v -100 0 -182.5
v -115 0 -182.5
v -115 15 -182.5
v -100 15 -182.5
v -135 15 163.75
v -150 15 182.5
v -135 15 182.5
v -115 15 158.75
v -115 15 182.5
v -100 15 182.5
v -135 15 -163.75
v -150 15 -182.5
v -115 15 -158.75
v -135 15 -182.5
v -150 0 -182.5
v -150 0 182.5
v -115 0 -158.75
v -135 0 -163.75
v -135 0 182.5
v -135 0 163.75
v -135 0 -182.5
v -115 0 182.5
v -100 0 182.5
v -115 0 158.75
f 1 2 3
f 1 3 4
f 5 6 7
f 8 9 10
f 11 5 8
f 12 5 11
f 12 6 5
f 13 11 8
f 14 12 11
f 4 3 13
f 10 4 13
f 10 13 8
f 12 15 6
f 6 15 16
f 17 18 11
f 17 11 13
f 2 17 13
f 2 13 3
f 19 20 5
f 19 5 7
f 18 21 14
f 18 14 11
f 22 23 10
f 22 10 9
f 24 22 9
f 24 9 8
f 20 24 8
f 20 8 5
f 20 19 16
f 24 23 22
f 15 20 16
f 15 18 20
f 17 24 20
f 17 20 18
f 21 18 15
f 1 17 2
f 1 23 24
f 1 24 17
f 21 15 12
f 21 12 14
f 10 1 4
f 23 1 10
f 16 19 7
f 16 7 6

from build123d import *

# Parameters (mm, degrees)
BOSS_EXTRUDE1_DEPTH             = 15
BOSS_EXTRUDE2_REACH             = 1239.023
BOSS_EXTRUDE2_DIRECTION_2_REACH = 1239.023
CUT_EXTRUDE2_DEPTH              = 1238.578280352
CUT_EXTRUDE2_DEPTH_BACK         = 1238.578280352
SKETCH5_W                       = 40
SKETCH5_H                       = 40
CUT_EXTRUDE3_DEPTH              = 1238.578280352
BOSS_EXTRUDE4_DEPTH             = 75
CUT_EXTRUDE4_DEPTH              = 1241.107934819
CUT_EXTRUDE4_DEPTH_BACK         = 1241.107934819
SKETCH8_W                       = 15
SKETCH8_H                       = 73.7
FILLET1_R                       = 5
CUT_EXTRUDE5_DEPTH              = 1241.107934819
CUT_EXTRUDE5_DEPTH_BACK         = 1241.107934819
SKETCH9_W                       = 25
SKETCH9_H                       = 15
SKETCH9_W_2                     = 15
CUT_EXTRUDE6_DEPTH              = 1241.107934819
CUT_EXTRUDE6_DEPTH_BACK         = 1241.107934819
SKETCH10_W                      = 1728.920732784
SKETCH10_H                      = 178.853868908
SKETCH10_W_2                    = 1650
SKETCH10_H_2                    = 15
SKETCH11_W                      = 1852.680615207
SKETCH11_H                      = 1075.927112831
CUT_EXTRUDE7_DEPTH              = 1238.022635201


with BuildPart() as part:
    # Sketch1 → Boss-Extrude1 (new body)
    with BuildSketch(Plane(origin=(0, 0, 0), x_dir=(1, 0, 0), z_dir=(0, 1, 0))):
        Polygon((-450, 300), (-400, 300), (-200, 250), (600, 40), (1200, 40), (1200, -40), (600, -40), (-200, -250), (-400, -300), (-450, -300), align=None)
    extrude(amount=BOSS_EXTRUDE1_DEPTH)

    # Boss-Extrude2: up to this face of the body (flat: up to its plane)
    boss_extrude2_end = Plane(part.part.faces().sort_by_distance((-425, 7.5, 300))[0])
    # Sketch2 → Boss-Extrude2 (add, up to the picked face)
    with BuildSketch(Plane.XY, mode=Mode.PRIVATE) as boss_extrude2_sk1:
        with BuildLine():
            Line((-425, 0), (-450, 0))
            Line((-450, 0), (-450, -40))
            Line((-450, -40), (-440, -40))
            Line((-440, -40), (-440, -15))
            ThreePointArc((-440, -15), (-435.606601718, -4.393398282), (-425, 0))
        make_face()
    boss_extrude2_tool1 = split(extrude(boss_extrude2_sk1.sketch, amount=BOSS_EXTRUDE2_REACH, mode=Mode.PRIVATE), bisect_by=boss_extrude2_end, keep=Keep.BOTH, mode=Mode.PRIVATE)
    # Sketch2 → Boss-Extrude2 (add, up to the picked face)
    with BuildSketch(Plane.XY, mode=Mode.PRIVATE) as boss_extrude2_sk2:
        with BuildLine():
            Line((-400, 0), (-425, 0))
            ThreePointArc((-425, 0), (-414.393398282, -4.393398282), (-410, -15))
            Line((-410, -15), (-410, -40))
            Line((-410, -40), (-400, -40))
            Line((-400, -40), (-400, 0))
        make_face()
    boss_extrude2_tool2 = split(extrude(boss_extrude2_sk2.sketch, amount=BOSS_EXTRUDE2_REACH, mode=Mode.PRIVATE), bisect_by=boss_extrude2_end, keep=Keep.BOTH, mode=Mode.PRIVATE)
    add(boss_extrude2_tool1.solids().sort_by(Axis((-444.100555, -18.206662, 0), (0, 0, 1)))[0])
    add(boss_extrude2_tool2.solids().sort_by(Axis((-405.899445, -18.206662, 0), (0, 0, 1)))[0])

    # Boss-Extrude2 direction 2: up to this face of the body (flat: up to its plane)
    boss_extrude2_direction_2_end = Plane(part.part.faces().sort_by_distance((-425, 7.5, -300))[0])
    # Sketch2 → Boss-Extrude2 direction 2 (add, up to the picked face)
    with BuildSketch(Plane.XY, mode=Mode.PRIVATE) as boss_extrude2_direction_2_sk1:
        with BuildLine():
            Line((-425, 0), (-450, 0))
            Line((-450, 0), (-450, -40))
            Line((-450, -40), (-440, -40))
            Line((-440, -40), (-440, -15))
            ThreePointArc((-440, -15), (-435.606601718, -4.393398282), (-425, 0))
        make_face()
    boss_extrude2_direction_2_tool1 = split(extrude(boss_extrude2_direction_2_sk1.sketch, amount=-BOSS_EXTRUDE2_DIRECTION_2_REACH, mode=Mode.PRIVATE), bisect_by=boss_extrude2_direction_2_end, keep=Keep.BOTH, mode=Mode.PRIVATE)
    # Sketch2 → Boss-Extrude2 direction 2 (add, up to the picked face)
    with BuildSketch(Plane.XY, mode=Mode.PRIVATE) as boss_extrude2_direction_2_sk2:
        with BuildLine():
            Line((-400, 0), (-425, 0))
            ThreePointArc((-425, 0), (-414.393398282, -4.393398282), (-410, -15))
            Line((-410, -15), (-410, -40))
            Line((-410, -40), (-400, -40))
            Line((-400, -40), (-400, 0))
        make_face()
    boss_extrude2_direction_2_tool2 = split(extrude(boss_extrude2_direction_2_sk2.sketch, amount=-BOSS_EXTRUDE2_DIRECTION_2_REACH, mode=Mode.PRIVATE), bisect_by=boss_extrude2_direction_2_end, keep=Keep.BOTH, mode=Mode.PRIVATE)
    add(boss_extrude2_direction_2_tool1.solids().sort_by(Axis((-444.100555, -18.206662, 0), (0, 0, -1)))[0])
    add(boss_extrude2_direction_2_tool2.solids().sort_by(Axis((-405.899445, -18.206662, 0), (0, 0, -1)))[0])

    # Sketch4 → Cut-Extrude2 (cut, two sides: drawn at the far end of the back side and taken through both)
    with BuildSketch(Plane(origin=(0, 0, 0), x_dir=(1, 0, 0), z_dir=(0, 1, 0)).offset(-CUT_EXTRUDE2_DEPTH_BACK)):
        Polygon((-450, 230), (-400, 230), (-150, 167.5), (-150, -167.5), (-400, -230), (-450, -230), align=None)
        Polygon((-100, 155), (-100, -155), (520, 0), align=None)
    extrude(amount=CUT_EXTRUDE2_DEPTH + CUT_EXTRUDE2_DEPTH_BACK, mode=Mode.SUBTRACT)

    # Sketch5 → Cut-Extrude3 (cut, through all)
    with BuildSketch(Plane(origin=(0, 0, 0), x_dir=(0, 0, -1), z_dir=(1, 0, 0))):
        with Locations((-265, -20)):
            Rectangle(SKETCH5_W, SKETCH5_H)
        with Locations((265, -20)):
            Rectangle(SKETCH5_W, SKETCH5_H)
    extrude(amount=-CUT_EXTRUDE3_DEPTH, mode=Mode.SUBTRACT)

    # Sketch7 → Boss-Extrude4 (add)
    with BuildSketch(Plane(origin=(1200, 0, 0), x_dir=(0, 0, -1), z_dir=(1, 0, 0))):
        with BuildLine():
            Line((-87.5, 50), (-40, 15))
            Line((-40, 15), (40, 15))
            Line((40, 15), (87.5, 50))
            Line((87.5, 50), (87.5, 88.7))
            Line((87.5, 88.7), (58.5, 88.7))
            Line((58.5, 88.7), (58.5, 63.2))
            Line((58.5, 63.2), (48.5, 63.2))
            Line((48.5, 63.2), (48.5, 88.7))
            Line((48.5, 88.7), (20, 88.7))
            Line((20, 88.7), (20, 50))
            ThreePointArc((20, 50), (0, 30), (-20, 50))
            Line((-20, 50), (-20, 88.7))
            Line((-20, 88.7), (-63, 88.7))
            Line((-63, 88.7), (-63, 63.2))
            Line((-63, 63.2), (-73, 63.2))
            Line((-73, 63.2), (-73, 88.7))
            Line((-73, 88.7), (-87.5, 88.7))
            Line((-87.5, 88.7), (-87.5, 50))
        make_face()
    extrude(amount=-BOSS_EXTRUDE4_DEPTH)

    # Sketch8 → Cut-Extrude4 (cut, two sides: drawn at the far end of the back side and taken through both)
    with BuildSketch(Plane.XY.offset(-CUT_EXTRUDE4_DEPTH_BACK)):
        with Locations((1147.5, 51.85)):
            Rectangle(SKETCH8_W, SKETCH8_H)
        with Locations((1177.5, 51.85)):
            Rectangle(SKETCH8_W, SKETCH8_H)
    extrude(amount=CUT_EXTRUDE4_DEPTH + CUT_EXTRUDE4_DEPTH_BACK, mode=Mode.SUBTRACT)

    # Fillet1
    fillet1_edges = [part.edges().sort_by_distance(p)[0] for p in [
        (1192.5, 50, 87.5),
        (1162.5, 50, 87.5),
        (1132.5, 50, 87.5),
        (1192.5, 50, -87.5),
        (1162.5, 50, -87.5),
        (1132.5, 50, -87.5),
        (1192.5, 88.7, -87.5),
        (1162.5, 88.7, -87.5),
        (1132.5, 88.7, -87.5),
        (1132.5, 88.7, -58.5),
        (1162.5, 88.7, -58.5),
        (1192.5, 88.7, -58.5),
        (1192.5, 88.7, -48.5),
        (1162.5, 88.7, -48.5),
        (1132.5, 88.7, -48.5),
        (1192.5, 88.7, -20),
        (1162.5, 88.7, -20),
        (1132.5, 88.7, -20),
        (1192.5, 88.7, 63),
        (1162.5, 88.7, 63),
        (1132.5, 88.7, 63),
        (1132.5, 88.7, 87.5),
        (1162.5, 88.7, 87.5),
        (1192.5, 88.7, 87.5),
        (1192.5, 88.7, 73),
        (1162.5, 88.7, 73),
        (1132.5, 88.7, 73),
        (1192.5, 88.7, 20),
        (1162.5, 88.7, 20),
        (1132.5, 88.7, 20),
        (600, 7.5, 40),
        (600, 7.5, -40),
        (520, 7.5, 0),
        (-440, -40, -292.5),
        (-440, -40, -237.5),
        (-400, -40, -292.5),
        (-400, -40, -237.5),
        (-450, -40, -237.5),
        (-410, -40, -237.5),
        (-450, -40, -292.5),
        (-410, -40, -292.5),
        (-150, 7.5, 167.5),
        (-100, 7.5, 155),
        (-150, 7.5, -167.5),
        (-100, 7.5, -155),
        (-450, -40, 237.5),
        (-410, -40, 237.5),
        (-440, -40, 237.5),
        (-400, -40, 237.5),
        (-450, -40, 292.5),
        (-440, -40, 292.5),
        (-400, -40, 292.5),
        (-410, -40, 292.5),
    ]]
    fillet(fillet1_edges, radius=FILLET1_R - 0.0001)  # a hair under: the kernel refuses the full size

    # Sketch9 → Cut-Extrude5 (cut, two sides: drawn at the far end of the back side and taken through both)
    with BuildSketch(Plane(origin=(0, 0, 0), x_dir=(1, 0, 0), z_dir=(0, 1, 0)).offset(-CUT_EXTRUDE5_DEPTH_BACK)):
        with Locations((-425, -292.5)):
            Rectangle(SKETCH9_W, SKETCH9_H)
        with Locations((1192.5, -32.5)):
            Rectangle(SKETCH9_W_2, SKETCH9_H)
        with Locations((1192.5, 32.5)):
            Rectangle(SKETCH9_W_2, SKETCH9_H)
        with Locations((1162.5, 32.5)):
            Rectangle(SKETCH9_W_2, SKETCH9_H)
        with Locations((1132.5, 32.5)):
            Rectangle(SKETCH9_W_2, SKETCH9_H)
        with Locations((1132.5, -32.5)):
            Rectangle(SKETCH9_W_2, SKETCH9_H)
        with Locations((1162.5, -32.5)):
            Rectangle(SKETCH9_W_2, SKETCH9_H)
        with Locations((-425, -237.5)):
            Rectangle(SKETCH9_W, SKETCH9_H)
        with Locations((-425, 237.5)):
            Rectangle(SKETCH9_W, SKETCH9_H)
        with Locations((-425, 292.5)):
            Rectangle(SKETCH9_W, SKETCH9_H)
    extrude(amount=CUT_EXTRUDE5_DEPTH + CUT_EXTRUDE5_DEPTH_BACK, mode=Mode.SUBTRACT)


with BuildPart() as cut_extrude5_piece_1:
    # of the separate pieces the step leaves, piece 1, a body of its own (cut_extrude5_pieces)
    add(part.part.solids().sort_by_distance((-400, -35.0001, -300))[0])


with BuildPart() as cut_extrude5_piece_2:
    # of the separate pieces the step leaves, piece 2, a body of its own (cut_extrude5_pieces)
    add(part.part.solids().sort_by_distance((1170, 48.501289589, 85.46603587))[0])


with BuildPart() as cut_extrude5_piece_3:
    # of the separate pieces the step leaves, piece 3, a body of its own (cut_extrude5_pieces)
    add(part.part.solids().sort_by_distance((1170, 48.501289589, -85.46603587))[0])


with BuildPart() as cut_extrude5_piece_4:
    # of the separate pieces the step leaves, piece 4, a body of its own (cut_extrude5_pieces)
    add(part.part.solids().sort_by_distance((1125, 83.7001, 73))[0])


with BuildPart() as cut_extrude5_piece_5:
    # of the separate pieces the step leaves, piece 5, a body of its own (cut_extrude5_pieces)
    add(part.part.solids().sort_by_distance((1200, 48.501289589, 85.46603587))[0])


with BuildPart() as cut_extrude5_piece_6:
    # of the separate pieces the step leaves, piece 6, a body of its own (cut_extrude5_pieces)
    add(part.part.solids().sort_by_distance((1200, 48.501289589, -85.46603587))[0])


with BuildPart() as cut_extrude5_piece_7:
    # of the separate pieces the step leaves, piece 7, a body of its own (cut_extrude5_pieces)
    add(part.part.solids().sort_by_distance((1125, 88.7, -40))[0])


with BuildPart() as cut_extrude6_tool:
    # Sketch10 → Cut-Extrude6 (new, two sides: drawn at the far end of the back side and taken through both)
    with BuildSketch(Plane.XY.offset(-CUT_EXTRUDE6_DEPTH_BACK)):
        with Locations((378.379601058, 20.599691165)):
            Rectangle(SKETCH10_W, SKETCH10_H)
        with Locations((375, 7.5)):
            Rectangle(SKETCH10_W_2, SKETCH10_H_2, mode=Mode.SUBTRACT)
    extrude(amount=CUT_EXTRUDE6_DEPTH + CUT_EXTRUDE6_DEPTH_BACK)


with BuildPart() as cut_extrude5_piece_1_1:
    add(cut_extrude5_piece_1.part)

    # Cut-Extrude6: cut by cut_extrude6_tool
    add(cut_extrude6_tool.part, mode=Mode.SUBTRACT)

    # Sketch11 → Cut-Extrude7 (cut, through all)
    # profile 1 of 5: a face of its own
    with BuildSketch(Plane(origin=(0, 0, 0), x_dir=(1, 0, 0), z_dir=(0, 1, 0))):
        with Locations((324.970767393, -26.108881651)):
            Rectangle(SKETCH11_W, SKETCH11_H)
        Polygon((309.276307823, -116.314969197), (-450, -315.625), (-450, -242.5), (-450, -230), (-400, -230), (-150, -167.5), (-150, 0), (-150, 167.5), (-150, 182.5), (-135, 182.5), (-135, 163.75), (-115, 158.75), (-115, 182.5), (-100, 182.5), (-100, 155), (-100, 0), (-100, -155), (293.601058917, -56.599735271), (308.154197556, -52.961450611), (311.917995324, -67.299727825), (319.976300377, -97.99803279), (323.784772304, -112.50649727), align=None, mode=Mode.SUBTRACT)
    # profile 2 of 5: a face of its own
    with BuildSketch(Plane(origin=(0, 0, 0), x_dir=(1, 0, 0), z_dir=(0, 1, 0))):
        Polygon((-450, -242.5), (-450, -315.625), (309.276307823, -116.314969197), (305.467835897, -101.806504716), (319.976300377, -97.99803279), (311.917995324, -67.299727825), (297.409530844, -71.108199751), (293.601058917, -56.599735271), (-100, -155), (-100, -182.5), (-115, -182.5), (-115, -158.75), (-135, -163.75), (-135, -182.5), (-150, -182.5), (-150, -167.5), (-400, -230), align=None)
    # profile 3 of 5: a face of its own
    with BuildSketch(Plane(origin=(0, 0, 0), x_dir=(1, 0, 0), z_dir=(0, 1, 0))):
        Polygon((-450, -230), (-450, -242.5), (-400, -230), align=None)
    # profile 4 of 5: a face of its own
    with BuildSketch(Plane(origin=(0, 0, 0), x_dir=(1, 0, 0), z_dir=(0, 1, 0))):
        Polygon((305.467835897, -101.806504716), (309.276307823, -116.314969197), (323.784772304, -112.50649727), (319.976300377, -97.99803279), align=None)
    # profile 5 of 5: a face of its own
    with BuildSketch(Plane(origin=(0, 0, 0), x_dir=(1, 0, 0), z_dir=(0, 1, 0))):
        Polygon((297.409530844, -71.108199751), (311.917995324, -67.299727825), (308.154197556, -52.961450611), (293.601058917, -56.599735271), align=None)
    extrude(amount=CUT_EXTRUDE7_DEPTH, mode=Mode.SUBTRACT)


with BuildPart() as cut_extrude5_piece_2_1:
    add(cut_extrude5_piece_2.part)

    # Cut-Extrude6: cut by cut_extrude6_tool
    add(cut_extrude6_tool.part, mode=Mode.SUBTRACT)


with BuildPart() as cut_extrude5_piece_3_1:
    add(cut_extrude5_piece_3.part)

    # Cut-Extrude6: cut by cut_extrude6_tool
    add(cut_extrude6_tool.part, mode=Mode.SUBTRACT)


with BuildPart() as cut_extrude5_piece_4_1:
    add(cut_extrude5_piece_4.part)

    # Cut-Extrude6: cut by cut_extrude6_tool
    add(cut_extrude6_tool.part, mode=Mode.SUBTRACT)


with BuildPart() as cut_extrude5_piece_5_1:
    add(cut_extrude5_piece_5.part)

    # Cut-Extrude6: cut by cut_extrude6_tool
    add(cut_extrude6_tool.part, mode=Mode.SUBTRACT)


with BuildPart() as cut_extrude5_piece_6_1:
    add(cut_extrude5_piece_6.part)

    # Cut-Extrude6: cut by cut_extrude6_tool
    add(cut_extrude6_tool.part, mode=Mode.SUBTRACT)


with BuildPart() as cut_extrude5_piece_7_1:
    add(cut_extrude5_piece_7.part)

    # Cut-Extrude6: cut by cut_extrude6_tool
    add(cut_extrude6_tool.part, mode=Mode.SUBTRACT)


solid = cut_extrude5_piece_1_1.part
